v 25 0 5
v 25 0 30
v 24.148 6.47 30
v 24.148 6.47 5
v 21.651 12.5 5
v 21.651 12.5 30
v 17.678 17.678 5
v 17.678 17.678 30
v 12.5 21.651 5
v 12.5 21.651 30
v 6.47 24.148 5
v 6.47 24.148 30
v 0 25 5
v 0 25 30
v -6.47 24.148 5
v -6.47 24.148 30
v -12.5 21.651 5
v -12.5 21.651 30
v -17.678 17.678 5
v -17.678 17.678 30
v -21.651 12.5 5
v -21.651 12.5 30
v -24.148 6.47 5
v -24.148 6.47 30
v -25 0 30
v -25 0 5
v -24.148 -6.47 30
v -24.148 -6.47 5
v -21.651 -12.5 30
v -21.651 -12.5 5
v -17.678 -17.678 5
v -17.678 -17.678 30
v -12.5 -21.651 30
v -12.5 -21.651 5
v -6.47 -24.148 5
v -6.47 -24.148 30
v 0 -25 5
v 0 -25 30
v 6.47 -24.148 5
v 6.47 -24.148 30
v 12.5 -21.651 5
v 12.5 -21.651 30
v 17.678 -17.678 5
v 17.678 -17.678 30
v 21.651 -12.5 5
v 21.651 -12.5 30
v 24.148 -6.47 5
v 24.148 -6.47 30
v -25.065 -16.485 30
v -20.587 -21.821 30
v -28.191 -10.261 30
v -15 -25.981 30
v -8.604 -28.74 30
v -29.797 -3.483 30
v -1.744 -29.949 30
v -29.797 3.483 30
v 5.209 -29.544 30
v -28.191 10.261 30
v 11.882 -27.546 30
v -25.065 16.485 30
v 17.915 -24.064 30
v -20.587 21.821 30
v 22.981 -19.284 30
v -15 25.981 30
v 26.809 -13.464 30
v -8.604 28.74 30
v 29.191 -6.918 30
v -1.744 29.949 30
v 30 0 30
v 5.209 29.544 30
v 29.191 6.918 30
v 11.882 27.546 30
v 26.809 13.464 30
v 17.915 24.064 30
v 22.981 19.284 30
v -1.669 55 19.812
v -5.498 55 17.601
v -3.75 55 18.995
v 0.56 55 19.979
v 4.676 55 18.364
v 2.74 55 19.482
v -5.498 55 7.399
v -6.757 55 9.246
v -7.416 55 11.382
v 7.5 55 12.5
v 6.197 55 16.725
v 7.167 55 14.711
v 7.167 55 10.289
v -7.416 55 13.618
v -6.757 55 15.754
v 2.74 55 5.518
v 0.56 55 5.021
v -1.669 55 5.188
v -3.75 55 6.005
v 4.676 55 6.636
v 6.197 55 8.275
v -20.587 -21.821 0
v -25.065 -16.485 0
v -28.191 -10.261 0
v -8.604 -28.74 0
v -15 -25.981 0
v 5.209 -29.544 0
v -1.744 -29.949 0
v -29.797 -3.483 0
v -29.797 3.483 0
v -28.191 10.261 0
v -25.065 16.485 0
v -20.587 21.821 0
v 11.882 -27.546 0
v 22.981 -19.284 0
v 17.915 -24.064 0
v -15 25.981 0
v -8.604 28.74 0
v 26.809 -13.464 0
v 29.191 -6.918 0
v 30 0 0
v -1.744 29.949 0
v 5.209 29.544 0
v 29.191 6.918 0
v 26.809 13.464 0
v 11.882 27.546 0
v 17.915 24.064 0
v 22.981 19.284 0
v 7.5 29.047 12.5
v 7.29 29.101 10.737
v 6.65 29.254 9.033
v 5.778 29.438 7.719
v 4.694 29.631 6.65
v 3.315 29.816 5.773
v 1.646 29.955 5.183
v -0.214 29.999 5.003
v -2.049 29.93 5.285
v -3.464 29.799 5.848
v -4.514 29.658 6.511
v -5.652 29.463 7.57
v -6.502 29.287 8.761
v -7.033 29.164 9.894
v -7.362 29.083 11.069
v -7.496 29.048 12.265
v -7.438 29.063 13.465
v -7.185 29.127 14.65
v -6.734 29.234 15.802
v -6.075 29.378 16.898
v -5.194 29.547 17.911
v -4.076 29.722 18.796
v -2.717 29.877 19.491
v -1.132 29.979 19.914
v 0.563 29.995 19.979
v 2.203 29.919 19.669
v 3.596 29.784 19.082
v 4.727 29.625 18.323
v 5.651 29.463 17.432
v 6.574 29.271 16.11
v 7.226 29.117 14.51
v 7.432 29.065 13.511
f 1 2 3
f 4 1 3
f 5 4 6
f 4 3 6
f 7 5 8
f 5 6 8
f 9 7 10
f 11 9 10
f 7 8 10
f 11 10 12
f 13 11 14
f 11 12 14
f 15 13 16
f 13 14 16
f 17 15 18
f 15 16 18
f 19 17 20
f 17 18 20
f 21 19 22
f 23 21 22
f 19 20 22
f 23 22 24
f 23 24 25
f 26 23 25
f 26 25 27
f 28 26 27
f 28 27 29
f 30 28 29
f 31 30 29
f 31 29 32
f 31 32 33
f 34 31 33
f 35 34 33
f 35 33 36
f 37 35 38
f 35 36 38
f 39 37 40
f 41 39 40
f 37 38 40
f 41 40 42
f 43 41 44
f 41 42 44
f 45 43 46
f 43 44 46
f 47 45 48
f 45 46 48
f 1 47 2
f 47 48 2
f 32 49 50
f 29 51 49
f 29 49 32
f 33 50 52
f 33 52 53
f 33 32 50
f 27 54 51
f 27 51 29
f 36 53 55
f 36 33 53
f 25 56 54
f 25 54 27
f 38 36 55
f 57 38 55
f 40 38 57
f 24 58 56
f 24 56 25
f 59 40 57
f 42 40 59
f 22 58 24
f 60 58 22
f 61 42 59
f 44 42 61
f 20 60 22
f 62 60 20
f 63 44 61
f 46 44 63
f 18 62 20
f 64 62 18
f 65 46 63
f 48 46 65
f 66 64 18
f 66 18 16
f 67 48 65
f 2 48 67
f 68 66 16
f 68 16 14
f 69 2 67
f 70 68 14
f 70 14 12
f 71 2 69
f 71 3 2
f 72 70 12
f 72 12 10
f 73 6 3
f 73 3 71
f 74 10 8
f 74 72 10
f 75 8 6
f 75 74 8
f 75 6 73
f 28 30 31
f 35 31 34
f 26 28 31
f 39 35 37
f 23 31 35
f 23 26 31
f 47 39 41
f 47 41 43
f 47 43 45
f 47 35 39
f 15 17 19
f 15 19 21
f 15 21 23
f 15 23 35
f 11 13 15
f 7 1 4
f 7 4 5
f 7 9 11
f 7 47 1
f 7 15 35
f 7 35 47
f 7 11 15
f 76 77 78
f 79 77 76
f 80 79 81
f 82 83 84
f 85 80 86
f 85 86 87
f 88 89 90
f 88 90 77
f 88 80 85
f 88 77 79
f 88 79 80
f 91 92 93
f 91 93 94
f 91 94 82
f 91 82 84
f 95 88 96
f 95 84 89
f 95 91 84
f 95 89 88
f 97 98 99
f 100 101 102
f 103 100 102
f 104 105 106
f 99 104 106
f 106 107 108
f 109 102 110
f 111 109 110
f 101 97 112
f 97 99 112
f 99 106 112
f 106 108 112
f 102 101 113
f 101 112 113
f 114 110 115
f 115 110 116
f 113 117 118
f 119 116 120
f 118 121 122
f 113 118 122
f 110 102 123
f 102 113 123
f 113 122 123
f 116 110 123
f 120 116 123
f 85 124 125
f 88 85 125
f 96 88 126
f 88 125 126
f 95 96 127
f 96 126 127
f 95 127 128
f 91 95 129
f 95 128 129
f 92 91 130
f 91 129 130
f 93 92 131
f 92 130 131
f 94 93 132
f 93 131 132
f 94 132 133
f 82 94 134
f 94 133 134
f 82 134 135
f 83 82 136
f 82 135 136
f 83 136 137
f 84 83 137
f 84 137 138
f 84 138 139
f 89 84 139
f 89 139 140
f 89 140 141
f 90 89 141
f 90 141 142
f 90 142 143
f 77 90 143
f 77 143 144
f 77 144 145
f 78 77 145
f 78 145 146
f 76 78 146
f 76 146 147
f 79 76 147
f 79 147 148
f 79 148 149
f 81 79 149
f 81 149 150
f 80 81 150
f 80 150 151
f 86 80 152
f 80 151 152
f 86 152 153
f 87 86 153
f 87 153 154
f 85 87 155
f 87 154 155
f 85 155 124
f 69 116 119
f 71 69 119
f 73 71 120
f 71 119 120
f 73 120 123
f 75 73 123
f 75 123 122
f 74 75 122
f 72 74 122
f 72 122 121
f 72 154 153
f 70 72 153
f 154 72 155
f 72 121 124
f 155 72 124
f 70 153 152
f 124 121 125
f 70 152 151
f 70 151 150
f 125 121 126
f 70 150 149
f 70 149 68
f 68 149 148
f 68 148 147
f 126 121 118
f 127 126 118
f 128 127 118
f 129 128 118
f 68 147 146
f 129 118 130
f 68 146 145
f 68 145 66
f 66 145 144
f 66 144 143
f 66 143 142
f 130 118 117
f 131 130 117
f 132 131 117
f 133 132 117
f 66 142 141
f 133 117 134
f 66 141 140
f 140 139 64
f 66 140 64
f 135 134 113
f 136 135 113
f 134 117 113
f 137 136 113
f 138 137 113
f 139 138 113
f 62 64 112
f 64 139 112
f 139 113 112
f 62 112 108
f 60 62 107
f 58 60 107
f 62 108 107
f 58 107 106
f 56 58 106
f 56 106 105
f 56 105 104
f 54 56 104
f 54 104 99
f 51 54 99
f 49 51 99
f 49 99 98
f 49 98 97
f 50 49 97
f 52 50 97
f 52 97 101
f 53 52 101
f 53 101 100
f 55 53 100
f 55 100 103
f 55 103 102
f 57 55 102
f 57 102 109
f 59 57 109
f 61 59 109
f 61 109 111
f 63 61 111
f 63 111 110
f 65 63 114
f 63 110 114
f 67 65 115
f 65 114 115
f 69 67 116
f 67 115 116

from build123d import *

# Parameters (mm, degrees)
SKETCH_1_R          = 30
EXTRUDE_1_DEPTH     = 30
SKETCH_3_R          = 7.5
EXTRUDE_2_DEPTH     = 55
SKETCH_4_R          = 25
CUT_EXTRUDE_2_DEPTH = 25


with BuildPart() as part:
    # 草图1 → 凸台-拉伸1 (new body)
    with BuildSketch(Plane.XY):
        Circle(SKETCH_1_R)
    extrude(amount=EXTRUDE_1_DEPTH)

    # 草图3 → 凸台-拉伸2 (add)
    with BuildSketch(Plane(origin=(0, 0, 0), x_dir=(1, 0, 0), z_dir=(0, 1, 0))):
        with Locations((0, -12.5)):
            Circle(SKETCH_3_R)
    extrude(amount=EXTRUDE_2_DEPTH)

    # 草图4 → 切除-拉伸2 (cut)
    with BuildSketch(Plane.XY.offset(30)):
        Circle(SKETCH_4_R)
    extrude(amount=-CUT_EXTRUDE_2_DEPTH, mode=Mode.SUBTRACT)


solid = part.part
